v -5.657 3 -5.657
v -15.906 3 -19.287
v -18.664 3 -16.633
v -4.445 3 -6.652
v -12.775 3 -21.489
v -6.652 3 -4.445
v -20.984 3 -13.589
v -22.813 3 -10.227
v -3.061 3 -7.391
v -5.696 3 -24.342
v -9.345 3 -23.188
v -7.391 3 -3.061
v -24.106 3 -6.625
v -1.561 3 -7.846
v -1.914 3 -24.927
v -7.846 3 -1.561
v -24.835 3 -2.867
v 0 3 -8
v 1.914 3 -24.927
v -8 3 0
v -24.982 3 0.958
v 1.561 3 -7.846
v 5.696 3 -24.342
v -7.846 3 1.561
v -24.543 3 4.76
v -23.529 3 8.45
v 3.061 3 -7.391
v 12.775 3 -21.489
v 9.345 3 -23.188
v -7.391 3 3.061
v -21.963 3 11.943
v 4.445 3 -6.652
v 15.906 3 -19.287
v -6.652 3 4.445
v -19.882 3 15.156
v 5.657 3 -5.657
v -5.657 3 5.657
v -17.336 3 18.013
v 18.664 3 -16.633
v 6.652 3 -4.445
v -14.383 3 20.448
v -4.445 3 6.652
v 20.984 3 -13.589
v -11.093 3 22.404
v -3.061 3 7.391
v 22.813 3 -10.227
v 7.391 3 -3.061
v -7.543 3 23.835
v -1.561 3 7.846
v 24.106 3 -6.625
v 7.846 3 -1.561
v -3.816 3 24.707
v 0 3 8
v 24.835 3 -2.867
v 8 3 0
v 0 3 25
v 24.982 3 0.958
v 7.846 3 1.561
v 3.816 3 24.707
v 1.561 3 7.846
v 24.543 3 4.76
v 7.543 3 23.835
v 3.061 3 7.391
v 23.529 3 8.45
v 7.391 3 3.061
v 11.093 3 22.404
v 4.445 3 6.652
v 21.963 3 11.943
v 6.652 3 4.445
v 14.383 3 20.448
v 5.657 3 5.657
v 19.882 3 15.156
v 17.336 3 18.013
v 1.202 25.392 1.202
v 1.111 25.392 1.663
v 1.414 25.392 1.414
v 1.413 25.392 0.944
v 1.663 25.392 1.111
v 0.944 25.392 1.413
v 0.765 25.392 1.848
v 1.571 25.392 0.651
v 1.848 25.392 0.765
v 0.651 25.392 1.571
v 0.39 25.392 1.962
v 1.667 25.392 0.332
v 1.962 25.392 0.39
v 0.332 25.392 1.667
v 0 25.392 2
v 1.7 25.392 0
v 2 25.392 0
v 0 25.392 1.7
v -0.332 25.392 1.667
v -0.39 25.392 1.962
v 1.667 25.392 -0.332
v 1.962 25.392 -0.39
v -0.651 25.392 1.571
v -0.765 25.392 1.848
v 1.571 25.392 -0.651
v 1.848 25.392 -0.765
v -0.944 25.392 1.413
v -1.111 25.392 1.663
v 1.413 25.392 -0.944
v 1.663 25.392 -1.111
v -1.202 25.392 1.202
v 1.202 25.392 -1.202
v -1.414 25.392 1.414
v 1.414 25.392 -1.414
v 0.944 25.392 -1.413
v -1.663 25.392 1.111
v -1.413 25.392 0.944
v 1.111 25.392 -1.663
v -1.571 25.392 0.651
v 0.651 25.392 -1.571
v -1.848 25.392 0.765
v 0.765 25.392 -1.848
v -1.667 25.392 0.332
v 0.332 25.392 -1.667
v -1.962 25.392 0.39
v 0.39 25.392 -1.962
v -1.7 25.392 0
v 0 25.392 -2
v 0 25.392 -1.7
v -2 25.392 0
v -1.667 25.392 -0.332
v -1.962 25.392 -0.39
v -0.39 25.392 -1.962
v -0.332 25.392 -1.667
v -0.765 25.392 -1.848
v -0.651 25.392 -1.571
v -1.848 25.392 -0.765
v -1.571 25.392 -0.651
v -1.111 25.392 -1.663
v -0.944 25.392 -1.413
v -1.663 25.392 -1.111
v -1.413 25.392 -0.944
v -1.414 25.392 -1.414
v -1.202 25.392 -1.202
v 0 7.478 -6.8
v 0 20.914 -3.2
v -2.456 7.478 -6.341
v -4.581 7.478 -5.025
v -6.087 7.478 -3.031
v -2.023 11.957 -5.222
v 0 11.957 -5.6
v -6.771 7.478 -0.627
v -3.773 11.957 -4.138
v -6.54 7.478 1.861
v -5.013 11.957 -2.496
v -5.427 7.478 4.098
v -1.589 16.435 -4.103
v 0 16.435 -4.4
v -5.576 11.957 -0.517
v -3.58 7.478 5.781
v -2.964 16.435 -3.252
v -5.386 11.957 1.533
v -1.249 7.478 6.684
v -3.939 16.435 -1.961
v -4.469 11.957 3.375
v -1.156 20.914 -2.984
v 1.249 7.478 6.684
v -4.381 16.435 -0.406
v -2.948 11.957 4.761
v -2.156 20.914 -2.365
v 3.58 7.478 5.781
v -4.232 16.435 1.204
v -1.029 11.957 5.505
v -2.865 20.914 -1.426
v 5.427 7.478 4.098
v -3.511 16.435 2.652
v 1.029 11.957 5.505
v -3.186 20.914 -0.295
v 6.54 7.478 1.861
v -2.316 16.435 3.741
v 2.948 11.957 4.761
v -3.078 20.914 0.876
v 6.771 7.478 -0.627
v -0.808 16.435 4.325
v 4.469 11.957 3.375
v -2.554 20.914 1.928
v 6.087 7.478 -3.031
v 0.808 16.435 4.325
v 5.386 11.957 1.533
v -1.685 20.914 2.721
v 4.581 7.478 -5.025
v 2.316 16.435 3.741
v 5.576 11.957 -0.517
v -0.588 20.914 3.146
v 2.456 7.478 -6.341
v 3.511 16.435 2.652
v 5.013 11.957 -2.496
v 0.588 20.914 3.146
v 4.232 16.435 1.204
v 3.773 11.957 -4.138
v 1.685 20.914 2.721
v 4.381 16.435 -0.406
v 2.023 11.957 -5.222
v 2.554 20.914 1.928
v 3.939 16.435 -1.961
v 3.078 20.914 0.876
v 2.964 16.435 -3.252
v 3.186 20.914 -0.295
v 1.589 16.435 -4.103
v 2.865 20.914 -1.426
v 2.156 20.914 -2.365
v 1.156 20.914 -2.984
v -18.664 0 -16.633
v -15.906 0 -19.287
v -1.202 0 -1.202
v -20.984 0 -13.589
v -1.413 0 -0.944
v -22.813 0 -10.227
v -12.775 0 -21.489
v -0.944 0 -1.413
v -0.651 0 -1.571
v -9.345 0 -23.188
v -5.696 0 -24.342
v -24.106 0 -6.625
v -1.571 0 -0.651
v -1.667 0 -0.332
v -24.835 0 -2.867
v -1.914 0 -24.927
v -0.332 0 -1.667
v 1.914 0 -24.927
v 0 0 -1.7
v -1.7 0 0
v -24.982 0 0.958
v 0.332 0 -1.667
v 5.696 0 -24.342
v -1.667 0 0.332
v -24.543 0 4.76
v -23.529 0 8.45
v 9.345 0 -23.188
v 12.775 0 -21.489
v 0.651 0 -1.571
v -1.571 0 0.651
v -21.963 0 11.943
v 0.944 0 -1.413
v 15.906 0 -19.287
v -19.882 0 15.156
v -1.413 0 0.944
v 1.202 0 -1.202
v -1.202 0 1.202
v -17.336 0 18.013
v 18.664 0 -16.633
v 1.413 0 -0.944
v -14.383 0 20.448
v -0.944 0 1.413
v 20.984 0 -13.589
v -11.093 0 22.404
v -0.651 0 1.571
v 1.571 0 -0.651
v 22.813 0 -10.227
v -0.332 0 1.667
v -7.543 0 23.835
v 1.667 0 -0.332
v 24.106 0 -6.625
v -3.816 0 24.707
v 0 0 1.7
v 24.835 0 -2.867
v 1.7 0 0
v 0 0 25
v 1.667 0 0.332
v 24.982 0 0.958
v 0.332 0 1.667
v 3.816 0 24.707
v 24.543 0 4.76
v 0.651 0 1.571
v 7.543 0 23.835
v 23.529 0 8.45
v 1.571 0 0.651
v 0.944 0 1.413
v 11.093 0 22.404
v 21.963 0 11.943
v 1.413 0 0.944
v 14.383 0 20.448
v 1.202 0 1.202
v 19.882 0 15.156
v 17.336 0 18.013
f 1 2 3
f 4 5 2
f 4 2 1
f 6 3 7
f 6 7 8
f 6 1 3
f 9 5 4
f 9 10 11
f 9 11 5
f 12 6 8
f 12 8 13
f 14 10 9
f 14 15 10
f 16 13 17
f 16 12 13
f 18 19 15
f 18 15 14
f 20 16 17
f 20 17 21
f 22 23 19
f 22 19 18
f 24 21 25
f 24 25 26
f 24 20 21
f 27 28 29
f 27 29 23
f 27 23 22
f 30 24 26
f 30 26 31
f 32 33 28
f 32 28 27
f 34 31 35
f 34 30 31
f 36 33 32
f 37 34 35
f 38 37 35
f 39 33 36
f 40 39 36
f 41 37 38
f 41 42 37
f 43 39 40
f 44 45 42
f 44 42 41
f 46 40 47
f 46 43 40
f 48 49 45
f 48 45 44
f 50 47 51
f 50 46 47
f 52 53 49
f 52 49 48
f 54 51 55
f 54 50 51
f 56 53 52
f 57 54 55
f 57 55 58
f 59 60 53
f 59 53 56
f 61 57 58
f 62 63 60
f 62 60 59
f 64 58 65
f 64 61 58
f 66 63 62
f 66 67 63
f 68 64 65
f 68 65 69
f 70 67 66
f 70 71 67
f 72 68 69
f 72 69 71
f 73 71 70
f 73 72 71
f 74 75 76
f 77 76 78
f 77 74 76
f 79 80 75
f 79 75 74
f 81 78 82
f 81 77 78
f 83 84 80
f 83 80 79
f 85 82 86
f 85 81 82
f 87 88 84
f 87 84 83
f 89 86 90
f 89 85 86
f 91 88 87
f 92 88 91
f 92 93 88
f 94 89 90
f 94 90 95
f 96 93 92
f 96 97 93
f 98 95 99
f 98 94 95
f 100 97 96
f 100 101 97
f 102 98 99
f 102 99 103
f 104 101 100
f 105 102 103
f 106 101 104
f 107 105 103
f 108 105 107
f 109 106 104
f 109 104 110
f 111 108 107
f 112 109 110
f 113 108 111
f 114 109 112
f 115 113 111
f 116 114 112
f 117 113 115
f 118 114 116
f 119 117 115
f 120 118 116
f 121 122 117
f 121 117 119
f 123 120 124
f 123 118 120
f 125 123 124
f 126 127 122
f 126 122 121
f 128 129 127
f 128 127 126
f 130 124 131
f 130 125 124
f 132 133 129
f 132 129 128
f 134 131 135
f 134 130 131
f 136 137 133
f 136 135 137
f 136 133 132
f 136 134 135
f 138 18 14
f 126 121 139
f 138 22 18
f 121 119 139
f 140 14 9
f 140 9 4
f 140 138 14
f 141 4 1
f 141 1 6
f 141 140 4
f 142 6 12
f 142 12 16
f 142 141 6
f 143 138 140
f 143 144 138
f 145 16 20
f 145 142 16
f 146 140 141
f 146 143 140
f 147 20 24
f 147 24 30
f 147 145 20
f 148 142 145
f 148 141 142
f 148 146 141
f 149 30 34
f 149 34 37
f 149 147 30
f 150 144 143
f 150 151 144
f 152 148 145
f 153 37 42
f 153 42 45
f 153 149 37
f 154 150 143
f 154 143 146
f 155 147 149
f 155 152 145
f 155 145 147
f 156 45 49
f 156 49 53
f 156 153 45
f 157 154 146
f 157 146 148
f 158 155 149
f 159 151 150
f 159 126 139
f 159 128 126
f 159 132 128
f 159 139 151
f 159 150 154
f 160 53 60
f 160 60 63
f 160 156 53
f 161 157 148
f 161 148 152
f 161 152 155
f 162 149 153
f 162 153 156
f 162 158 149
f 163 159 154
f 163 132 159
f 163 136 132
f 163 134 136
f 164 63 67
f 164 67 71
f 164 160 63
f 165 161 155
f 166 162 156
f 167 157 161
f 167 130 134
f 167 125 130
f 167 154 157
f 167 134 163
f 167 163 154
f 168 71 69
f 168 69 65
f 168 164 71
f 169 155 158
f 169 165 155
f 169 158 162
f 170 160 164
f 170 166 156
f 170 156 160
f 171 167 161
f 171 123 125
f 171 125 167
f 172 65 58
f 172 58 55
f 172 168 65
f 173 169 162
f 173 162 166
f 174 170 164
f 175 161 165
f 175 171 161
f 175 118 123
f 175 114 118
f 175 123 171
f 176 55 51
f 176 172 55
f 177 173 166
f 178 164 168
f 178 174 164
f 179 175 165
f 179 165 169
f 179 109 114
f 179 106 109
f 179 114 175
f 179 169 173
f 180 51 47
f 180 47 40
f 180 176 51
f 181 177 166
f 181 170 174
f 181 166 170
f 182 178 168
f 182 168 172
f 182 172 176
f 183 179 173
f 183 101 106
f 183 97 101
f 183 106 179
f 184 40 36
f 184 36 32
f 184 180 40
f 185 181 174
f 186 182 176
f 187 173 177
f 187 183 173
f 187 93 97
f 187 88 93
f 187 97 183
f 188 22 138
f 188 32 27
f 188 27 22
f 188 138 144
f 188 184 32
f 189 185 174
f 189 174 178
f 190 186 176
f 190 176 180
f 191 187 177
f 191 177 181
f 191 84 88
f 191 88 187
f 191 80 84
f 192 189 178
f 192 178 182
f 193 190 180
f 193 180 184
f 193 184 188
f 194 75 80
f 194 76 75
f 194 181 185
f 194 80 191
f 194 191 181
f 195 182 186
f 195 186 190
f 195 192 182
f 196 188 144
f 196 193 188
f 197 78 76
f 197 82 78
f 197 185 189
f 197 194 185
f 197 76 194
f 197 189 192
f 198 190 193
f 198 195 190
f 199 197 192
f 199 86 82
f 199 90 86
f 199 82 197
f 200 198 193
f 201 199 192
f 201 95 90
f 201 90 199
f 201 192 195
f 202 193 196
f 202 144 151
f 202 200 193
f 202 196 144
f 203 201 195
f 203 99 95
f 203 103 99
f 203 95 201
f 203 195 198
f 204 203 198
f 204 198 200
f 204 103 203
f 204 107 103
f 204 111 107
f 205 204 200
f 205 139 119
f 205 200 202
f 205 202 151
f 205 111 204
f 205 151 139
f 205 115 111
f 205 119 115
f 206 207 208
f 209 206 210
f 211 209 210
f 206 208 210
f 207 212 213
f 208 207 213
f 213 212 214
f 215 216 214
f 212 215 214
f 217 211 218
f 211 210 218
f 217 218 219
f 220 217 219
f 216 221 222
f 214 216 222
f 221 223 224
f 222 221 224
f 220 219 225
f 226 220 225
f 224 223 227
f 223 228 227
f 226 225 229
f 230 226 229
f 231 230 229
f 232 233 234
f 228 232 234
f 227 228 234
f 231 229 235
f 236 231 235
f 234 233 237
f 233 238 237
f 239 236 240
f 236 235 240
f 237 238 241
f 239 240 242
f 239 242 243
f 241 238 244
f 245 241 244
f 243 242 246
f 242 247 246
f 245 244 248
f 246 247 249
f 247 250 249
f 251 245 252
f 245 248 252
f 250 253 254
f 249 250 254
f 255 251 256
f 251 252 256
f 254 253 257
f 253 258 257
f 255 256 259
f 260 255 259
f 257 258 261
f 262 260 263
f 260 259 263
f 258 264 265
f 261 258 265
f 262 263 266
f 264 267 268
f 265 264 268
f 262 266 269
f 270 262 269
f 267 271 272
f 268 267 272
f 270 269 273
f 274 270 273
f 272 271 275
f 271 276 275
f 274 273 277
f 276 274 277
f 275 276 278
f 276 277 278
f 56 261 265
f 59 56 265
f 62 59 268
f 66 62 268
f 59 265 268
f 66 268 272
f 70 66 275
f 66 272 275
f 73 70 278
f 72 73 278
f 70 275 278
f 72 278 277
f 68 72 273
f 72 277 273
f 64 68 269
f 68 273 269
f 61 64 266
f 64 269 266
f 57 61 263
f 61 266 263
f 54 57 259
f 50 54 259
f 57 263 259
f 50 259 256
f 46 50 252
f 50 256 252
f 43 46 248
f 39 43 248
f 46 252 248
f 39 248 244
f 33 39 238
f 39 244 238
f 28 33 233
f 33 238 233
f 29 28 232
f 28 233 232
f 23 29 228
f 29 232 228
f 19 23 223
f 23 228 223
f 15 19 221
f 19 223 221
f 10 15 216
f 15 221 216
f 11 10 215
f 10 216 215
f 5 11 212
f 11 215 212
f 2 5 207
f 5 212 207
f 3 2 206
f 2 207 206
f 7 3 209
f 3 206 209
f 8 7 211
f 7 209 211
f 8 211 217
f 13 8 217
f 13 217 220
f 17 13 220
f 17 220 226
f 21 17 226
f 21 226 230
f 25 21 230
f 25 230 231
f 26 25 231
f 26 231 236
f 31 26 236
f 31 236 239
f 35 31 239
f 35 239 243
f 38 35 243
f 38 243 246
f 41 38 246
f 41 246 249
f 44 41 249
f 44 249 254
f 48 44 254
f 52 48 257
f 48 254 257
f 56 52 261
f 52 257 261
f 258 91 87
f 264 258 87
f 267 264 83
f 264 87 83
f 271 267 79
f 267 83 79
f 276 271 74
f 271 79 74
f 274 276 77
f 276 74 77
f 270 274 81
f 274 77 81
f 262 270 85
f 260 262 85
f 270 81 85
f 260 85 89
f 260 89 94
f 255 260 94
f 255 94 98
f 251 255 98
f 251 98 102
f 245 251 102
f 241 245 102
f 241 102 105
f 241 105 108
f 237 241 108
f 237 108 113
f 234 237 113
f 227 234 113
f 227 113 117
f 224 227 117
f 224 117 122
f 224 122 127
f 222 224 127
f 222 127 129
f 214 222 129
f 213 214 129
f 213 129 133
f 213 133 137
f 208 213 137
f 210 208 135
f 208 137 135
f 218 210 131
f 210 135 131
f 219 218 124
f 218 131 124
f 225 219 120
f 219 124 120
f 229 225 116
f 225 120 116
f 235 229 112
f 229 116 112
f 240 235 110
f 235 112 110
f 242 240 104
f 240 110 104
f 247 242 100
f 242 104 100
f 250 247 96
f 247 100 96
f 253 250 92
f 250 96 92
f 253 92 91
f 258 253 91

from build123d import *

# Parameters (mm, degrees)
SKETCH1_R           = 25
BOSS_EXTRUDE1_DEPTH = 3
SKETCH3_R           = 1.7
CUT_EXTRUDE1_DEPTH  = 44.528946063


with BuildPart() as part:
    # Sketch1 → Boss-Extrude1 (new body)
    with BuildSketch(Plane(origin=(0, 0, 0), x_dir=(1, 0, 0), z_dir=(0, 1, 0))):
        with Locations(Location((0, 0, 0), (0, 0, 270))):
            Circle(SKETCH1_R)
    extrude(amount=BOSS_EXTRUDE1_DEPTH)

    # Sketch2 → Revolve1 (revolve)
    with BuildSketch(Plane(origin=(0, 0, 0), x_dir=(0, 0, -1), z_dir=(1, 0, 0)), mode=Mode.PRIVATE) as revolve1_sk:
        Polygon((-8, 3), (-2, 25.392304845), (0, 25.392304845), (0, 3), align=None)
    revolve(revolve1_sk.sketch.rotate(Axis((0, 0, 0), (0, 1, 0)), 180), axis=Axis((0, 0, 0), (0, 1, 0)))

    # Sketch3 → Cut-Extrude1 (cut, through all)
    with BuildSketch(Plane(origin=(0, 25.392304845, 0), x_dir=(1, 0, 0), z_dir=(0, 1, 0))):
        with Locations(Location((0, 0, 0), (0, 0, 270))):
            Circle(SKETCH3_R)
    extrude(amount=-CUT_EXTRUDE1_DEPTH, mode=Mode.SUBTRACT)


solid = part.part
